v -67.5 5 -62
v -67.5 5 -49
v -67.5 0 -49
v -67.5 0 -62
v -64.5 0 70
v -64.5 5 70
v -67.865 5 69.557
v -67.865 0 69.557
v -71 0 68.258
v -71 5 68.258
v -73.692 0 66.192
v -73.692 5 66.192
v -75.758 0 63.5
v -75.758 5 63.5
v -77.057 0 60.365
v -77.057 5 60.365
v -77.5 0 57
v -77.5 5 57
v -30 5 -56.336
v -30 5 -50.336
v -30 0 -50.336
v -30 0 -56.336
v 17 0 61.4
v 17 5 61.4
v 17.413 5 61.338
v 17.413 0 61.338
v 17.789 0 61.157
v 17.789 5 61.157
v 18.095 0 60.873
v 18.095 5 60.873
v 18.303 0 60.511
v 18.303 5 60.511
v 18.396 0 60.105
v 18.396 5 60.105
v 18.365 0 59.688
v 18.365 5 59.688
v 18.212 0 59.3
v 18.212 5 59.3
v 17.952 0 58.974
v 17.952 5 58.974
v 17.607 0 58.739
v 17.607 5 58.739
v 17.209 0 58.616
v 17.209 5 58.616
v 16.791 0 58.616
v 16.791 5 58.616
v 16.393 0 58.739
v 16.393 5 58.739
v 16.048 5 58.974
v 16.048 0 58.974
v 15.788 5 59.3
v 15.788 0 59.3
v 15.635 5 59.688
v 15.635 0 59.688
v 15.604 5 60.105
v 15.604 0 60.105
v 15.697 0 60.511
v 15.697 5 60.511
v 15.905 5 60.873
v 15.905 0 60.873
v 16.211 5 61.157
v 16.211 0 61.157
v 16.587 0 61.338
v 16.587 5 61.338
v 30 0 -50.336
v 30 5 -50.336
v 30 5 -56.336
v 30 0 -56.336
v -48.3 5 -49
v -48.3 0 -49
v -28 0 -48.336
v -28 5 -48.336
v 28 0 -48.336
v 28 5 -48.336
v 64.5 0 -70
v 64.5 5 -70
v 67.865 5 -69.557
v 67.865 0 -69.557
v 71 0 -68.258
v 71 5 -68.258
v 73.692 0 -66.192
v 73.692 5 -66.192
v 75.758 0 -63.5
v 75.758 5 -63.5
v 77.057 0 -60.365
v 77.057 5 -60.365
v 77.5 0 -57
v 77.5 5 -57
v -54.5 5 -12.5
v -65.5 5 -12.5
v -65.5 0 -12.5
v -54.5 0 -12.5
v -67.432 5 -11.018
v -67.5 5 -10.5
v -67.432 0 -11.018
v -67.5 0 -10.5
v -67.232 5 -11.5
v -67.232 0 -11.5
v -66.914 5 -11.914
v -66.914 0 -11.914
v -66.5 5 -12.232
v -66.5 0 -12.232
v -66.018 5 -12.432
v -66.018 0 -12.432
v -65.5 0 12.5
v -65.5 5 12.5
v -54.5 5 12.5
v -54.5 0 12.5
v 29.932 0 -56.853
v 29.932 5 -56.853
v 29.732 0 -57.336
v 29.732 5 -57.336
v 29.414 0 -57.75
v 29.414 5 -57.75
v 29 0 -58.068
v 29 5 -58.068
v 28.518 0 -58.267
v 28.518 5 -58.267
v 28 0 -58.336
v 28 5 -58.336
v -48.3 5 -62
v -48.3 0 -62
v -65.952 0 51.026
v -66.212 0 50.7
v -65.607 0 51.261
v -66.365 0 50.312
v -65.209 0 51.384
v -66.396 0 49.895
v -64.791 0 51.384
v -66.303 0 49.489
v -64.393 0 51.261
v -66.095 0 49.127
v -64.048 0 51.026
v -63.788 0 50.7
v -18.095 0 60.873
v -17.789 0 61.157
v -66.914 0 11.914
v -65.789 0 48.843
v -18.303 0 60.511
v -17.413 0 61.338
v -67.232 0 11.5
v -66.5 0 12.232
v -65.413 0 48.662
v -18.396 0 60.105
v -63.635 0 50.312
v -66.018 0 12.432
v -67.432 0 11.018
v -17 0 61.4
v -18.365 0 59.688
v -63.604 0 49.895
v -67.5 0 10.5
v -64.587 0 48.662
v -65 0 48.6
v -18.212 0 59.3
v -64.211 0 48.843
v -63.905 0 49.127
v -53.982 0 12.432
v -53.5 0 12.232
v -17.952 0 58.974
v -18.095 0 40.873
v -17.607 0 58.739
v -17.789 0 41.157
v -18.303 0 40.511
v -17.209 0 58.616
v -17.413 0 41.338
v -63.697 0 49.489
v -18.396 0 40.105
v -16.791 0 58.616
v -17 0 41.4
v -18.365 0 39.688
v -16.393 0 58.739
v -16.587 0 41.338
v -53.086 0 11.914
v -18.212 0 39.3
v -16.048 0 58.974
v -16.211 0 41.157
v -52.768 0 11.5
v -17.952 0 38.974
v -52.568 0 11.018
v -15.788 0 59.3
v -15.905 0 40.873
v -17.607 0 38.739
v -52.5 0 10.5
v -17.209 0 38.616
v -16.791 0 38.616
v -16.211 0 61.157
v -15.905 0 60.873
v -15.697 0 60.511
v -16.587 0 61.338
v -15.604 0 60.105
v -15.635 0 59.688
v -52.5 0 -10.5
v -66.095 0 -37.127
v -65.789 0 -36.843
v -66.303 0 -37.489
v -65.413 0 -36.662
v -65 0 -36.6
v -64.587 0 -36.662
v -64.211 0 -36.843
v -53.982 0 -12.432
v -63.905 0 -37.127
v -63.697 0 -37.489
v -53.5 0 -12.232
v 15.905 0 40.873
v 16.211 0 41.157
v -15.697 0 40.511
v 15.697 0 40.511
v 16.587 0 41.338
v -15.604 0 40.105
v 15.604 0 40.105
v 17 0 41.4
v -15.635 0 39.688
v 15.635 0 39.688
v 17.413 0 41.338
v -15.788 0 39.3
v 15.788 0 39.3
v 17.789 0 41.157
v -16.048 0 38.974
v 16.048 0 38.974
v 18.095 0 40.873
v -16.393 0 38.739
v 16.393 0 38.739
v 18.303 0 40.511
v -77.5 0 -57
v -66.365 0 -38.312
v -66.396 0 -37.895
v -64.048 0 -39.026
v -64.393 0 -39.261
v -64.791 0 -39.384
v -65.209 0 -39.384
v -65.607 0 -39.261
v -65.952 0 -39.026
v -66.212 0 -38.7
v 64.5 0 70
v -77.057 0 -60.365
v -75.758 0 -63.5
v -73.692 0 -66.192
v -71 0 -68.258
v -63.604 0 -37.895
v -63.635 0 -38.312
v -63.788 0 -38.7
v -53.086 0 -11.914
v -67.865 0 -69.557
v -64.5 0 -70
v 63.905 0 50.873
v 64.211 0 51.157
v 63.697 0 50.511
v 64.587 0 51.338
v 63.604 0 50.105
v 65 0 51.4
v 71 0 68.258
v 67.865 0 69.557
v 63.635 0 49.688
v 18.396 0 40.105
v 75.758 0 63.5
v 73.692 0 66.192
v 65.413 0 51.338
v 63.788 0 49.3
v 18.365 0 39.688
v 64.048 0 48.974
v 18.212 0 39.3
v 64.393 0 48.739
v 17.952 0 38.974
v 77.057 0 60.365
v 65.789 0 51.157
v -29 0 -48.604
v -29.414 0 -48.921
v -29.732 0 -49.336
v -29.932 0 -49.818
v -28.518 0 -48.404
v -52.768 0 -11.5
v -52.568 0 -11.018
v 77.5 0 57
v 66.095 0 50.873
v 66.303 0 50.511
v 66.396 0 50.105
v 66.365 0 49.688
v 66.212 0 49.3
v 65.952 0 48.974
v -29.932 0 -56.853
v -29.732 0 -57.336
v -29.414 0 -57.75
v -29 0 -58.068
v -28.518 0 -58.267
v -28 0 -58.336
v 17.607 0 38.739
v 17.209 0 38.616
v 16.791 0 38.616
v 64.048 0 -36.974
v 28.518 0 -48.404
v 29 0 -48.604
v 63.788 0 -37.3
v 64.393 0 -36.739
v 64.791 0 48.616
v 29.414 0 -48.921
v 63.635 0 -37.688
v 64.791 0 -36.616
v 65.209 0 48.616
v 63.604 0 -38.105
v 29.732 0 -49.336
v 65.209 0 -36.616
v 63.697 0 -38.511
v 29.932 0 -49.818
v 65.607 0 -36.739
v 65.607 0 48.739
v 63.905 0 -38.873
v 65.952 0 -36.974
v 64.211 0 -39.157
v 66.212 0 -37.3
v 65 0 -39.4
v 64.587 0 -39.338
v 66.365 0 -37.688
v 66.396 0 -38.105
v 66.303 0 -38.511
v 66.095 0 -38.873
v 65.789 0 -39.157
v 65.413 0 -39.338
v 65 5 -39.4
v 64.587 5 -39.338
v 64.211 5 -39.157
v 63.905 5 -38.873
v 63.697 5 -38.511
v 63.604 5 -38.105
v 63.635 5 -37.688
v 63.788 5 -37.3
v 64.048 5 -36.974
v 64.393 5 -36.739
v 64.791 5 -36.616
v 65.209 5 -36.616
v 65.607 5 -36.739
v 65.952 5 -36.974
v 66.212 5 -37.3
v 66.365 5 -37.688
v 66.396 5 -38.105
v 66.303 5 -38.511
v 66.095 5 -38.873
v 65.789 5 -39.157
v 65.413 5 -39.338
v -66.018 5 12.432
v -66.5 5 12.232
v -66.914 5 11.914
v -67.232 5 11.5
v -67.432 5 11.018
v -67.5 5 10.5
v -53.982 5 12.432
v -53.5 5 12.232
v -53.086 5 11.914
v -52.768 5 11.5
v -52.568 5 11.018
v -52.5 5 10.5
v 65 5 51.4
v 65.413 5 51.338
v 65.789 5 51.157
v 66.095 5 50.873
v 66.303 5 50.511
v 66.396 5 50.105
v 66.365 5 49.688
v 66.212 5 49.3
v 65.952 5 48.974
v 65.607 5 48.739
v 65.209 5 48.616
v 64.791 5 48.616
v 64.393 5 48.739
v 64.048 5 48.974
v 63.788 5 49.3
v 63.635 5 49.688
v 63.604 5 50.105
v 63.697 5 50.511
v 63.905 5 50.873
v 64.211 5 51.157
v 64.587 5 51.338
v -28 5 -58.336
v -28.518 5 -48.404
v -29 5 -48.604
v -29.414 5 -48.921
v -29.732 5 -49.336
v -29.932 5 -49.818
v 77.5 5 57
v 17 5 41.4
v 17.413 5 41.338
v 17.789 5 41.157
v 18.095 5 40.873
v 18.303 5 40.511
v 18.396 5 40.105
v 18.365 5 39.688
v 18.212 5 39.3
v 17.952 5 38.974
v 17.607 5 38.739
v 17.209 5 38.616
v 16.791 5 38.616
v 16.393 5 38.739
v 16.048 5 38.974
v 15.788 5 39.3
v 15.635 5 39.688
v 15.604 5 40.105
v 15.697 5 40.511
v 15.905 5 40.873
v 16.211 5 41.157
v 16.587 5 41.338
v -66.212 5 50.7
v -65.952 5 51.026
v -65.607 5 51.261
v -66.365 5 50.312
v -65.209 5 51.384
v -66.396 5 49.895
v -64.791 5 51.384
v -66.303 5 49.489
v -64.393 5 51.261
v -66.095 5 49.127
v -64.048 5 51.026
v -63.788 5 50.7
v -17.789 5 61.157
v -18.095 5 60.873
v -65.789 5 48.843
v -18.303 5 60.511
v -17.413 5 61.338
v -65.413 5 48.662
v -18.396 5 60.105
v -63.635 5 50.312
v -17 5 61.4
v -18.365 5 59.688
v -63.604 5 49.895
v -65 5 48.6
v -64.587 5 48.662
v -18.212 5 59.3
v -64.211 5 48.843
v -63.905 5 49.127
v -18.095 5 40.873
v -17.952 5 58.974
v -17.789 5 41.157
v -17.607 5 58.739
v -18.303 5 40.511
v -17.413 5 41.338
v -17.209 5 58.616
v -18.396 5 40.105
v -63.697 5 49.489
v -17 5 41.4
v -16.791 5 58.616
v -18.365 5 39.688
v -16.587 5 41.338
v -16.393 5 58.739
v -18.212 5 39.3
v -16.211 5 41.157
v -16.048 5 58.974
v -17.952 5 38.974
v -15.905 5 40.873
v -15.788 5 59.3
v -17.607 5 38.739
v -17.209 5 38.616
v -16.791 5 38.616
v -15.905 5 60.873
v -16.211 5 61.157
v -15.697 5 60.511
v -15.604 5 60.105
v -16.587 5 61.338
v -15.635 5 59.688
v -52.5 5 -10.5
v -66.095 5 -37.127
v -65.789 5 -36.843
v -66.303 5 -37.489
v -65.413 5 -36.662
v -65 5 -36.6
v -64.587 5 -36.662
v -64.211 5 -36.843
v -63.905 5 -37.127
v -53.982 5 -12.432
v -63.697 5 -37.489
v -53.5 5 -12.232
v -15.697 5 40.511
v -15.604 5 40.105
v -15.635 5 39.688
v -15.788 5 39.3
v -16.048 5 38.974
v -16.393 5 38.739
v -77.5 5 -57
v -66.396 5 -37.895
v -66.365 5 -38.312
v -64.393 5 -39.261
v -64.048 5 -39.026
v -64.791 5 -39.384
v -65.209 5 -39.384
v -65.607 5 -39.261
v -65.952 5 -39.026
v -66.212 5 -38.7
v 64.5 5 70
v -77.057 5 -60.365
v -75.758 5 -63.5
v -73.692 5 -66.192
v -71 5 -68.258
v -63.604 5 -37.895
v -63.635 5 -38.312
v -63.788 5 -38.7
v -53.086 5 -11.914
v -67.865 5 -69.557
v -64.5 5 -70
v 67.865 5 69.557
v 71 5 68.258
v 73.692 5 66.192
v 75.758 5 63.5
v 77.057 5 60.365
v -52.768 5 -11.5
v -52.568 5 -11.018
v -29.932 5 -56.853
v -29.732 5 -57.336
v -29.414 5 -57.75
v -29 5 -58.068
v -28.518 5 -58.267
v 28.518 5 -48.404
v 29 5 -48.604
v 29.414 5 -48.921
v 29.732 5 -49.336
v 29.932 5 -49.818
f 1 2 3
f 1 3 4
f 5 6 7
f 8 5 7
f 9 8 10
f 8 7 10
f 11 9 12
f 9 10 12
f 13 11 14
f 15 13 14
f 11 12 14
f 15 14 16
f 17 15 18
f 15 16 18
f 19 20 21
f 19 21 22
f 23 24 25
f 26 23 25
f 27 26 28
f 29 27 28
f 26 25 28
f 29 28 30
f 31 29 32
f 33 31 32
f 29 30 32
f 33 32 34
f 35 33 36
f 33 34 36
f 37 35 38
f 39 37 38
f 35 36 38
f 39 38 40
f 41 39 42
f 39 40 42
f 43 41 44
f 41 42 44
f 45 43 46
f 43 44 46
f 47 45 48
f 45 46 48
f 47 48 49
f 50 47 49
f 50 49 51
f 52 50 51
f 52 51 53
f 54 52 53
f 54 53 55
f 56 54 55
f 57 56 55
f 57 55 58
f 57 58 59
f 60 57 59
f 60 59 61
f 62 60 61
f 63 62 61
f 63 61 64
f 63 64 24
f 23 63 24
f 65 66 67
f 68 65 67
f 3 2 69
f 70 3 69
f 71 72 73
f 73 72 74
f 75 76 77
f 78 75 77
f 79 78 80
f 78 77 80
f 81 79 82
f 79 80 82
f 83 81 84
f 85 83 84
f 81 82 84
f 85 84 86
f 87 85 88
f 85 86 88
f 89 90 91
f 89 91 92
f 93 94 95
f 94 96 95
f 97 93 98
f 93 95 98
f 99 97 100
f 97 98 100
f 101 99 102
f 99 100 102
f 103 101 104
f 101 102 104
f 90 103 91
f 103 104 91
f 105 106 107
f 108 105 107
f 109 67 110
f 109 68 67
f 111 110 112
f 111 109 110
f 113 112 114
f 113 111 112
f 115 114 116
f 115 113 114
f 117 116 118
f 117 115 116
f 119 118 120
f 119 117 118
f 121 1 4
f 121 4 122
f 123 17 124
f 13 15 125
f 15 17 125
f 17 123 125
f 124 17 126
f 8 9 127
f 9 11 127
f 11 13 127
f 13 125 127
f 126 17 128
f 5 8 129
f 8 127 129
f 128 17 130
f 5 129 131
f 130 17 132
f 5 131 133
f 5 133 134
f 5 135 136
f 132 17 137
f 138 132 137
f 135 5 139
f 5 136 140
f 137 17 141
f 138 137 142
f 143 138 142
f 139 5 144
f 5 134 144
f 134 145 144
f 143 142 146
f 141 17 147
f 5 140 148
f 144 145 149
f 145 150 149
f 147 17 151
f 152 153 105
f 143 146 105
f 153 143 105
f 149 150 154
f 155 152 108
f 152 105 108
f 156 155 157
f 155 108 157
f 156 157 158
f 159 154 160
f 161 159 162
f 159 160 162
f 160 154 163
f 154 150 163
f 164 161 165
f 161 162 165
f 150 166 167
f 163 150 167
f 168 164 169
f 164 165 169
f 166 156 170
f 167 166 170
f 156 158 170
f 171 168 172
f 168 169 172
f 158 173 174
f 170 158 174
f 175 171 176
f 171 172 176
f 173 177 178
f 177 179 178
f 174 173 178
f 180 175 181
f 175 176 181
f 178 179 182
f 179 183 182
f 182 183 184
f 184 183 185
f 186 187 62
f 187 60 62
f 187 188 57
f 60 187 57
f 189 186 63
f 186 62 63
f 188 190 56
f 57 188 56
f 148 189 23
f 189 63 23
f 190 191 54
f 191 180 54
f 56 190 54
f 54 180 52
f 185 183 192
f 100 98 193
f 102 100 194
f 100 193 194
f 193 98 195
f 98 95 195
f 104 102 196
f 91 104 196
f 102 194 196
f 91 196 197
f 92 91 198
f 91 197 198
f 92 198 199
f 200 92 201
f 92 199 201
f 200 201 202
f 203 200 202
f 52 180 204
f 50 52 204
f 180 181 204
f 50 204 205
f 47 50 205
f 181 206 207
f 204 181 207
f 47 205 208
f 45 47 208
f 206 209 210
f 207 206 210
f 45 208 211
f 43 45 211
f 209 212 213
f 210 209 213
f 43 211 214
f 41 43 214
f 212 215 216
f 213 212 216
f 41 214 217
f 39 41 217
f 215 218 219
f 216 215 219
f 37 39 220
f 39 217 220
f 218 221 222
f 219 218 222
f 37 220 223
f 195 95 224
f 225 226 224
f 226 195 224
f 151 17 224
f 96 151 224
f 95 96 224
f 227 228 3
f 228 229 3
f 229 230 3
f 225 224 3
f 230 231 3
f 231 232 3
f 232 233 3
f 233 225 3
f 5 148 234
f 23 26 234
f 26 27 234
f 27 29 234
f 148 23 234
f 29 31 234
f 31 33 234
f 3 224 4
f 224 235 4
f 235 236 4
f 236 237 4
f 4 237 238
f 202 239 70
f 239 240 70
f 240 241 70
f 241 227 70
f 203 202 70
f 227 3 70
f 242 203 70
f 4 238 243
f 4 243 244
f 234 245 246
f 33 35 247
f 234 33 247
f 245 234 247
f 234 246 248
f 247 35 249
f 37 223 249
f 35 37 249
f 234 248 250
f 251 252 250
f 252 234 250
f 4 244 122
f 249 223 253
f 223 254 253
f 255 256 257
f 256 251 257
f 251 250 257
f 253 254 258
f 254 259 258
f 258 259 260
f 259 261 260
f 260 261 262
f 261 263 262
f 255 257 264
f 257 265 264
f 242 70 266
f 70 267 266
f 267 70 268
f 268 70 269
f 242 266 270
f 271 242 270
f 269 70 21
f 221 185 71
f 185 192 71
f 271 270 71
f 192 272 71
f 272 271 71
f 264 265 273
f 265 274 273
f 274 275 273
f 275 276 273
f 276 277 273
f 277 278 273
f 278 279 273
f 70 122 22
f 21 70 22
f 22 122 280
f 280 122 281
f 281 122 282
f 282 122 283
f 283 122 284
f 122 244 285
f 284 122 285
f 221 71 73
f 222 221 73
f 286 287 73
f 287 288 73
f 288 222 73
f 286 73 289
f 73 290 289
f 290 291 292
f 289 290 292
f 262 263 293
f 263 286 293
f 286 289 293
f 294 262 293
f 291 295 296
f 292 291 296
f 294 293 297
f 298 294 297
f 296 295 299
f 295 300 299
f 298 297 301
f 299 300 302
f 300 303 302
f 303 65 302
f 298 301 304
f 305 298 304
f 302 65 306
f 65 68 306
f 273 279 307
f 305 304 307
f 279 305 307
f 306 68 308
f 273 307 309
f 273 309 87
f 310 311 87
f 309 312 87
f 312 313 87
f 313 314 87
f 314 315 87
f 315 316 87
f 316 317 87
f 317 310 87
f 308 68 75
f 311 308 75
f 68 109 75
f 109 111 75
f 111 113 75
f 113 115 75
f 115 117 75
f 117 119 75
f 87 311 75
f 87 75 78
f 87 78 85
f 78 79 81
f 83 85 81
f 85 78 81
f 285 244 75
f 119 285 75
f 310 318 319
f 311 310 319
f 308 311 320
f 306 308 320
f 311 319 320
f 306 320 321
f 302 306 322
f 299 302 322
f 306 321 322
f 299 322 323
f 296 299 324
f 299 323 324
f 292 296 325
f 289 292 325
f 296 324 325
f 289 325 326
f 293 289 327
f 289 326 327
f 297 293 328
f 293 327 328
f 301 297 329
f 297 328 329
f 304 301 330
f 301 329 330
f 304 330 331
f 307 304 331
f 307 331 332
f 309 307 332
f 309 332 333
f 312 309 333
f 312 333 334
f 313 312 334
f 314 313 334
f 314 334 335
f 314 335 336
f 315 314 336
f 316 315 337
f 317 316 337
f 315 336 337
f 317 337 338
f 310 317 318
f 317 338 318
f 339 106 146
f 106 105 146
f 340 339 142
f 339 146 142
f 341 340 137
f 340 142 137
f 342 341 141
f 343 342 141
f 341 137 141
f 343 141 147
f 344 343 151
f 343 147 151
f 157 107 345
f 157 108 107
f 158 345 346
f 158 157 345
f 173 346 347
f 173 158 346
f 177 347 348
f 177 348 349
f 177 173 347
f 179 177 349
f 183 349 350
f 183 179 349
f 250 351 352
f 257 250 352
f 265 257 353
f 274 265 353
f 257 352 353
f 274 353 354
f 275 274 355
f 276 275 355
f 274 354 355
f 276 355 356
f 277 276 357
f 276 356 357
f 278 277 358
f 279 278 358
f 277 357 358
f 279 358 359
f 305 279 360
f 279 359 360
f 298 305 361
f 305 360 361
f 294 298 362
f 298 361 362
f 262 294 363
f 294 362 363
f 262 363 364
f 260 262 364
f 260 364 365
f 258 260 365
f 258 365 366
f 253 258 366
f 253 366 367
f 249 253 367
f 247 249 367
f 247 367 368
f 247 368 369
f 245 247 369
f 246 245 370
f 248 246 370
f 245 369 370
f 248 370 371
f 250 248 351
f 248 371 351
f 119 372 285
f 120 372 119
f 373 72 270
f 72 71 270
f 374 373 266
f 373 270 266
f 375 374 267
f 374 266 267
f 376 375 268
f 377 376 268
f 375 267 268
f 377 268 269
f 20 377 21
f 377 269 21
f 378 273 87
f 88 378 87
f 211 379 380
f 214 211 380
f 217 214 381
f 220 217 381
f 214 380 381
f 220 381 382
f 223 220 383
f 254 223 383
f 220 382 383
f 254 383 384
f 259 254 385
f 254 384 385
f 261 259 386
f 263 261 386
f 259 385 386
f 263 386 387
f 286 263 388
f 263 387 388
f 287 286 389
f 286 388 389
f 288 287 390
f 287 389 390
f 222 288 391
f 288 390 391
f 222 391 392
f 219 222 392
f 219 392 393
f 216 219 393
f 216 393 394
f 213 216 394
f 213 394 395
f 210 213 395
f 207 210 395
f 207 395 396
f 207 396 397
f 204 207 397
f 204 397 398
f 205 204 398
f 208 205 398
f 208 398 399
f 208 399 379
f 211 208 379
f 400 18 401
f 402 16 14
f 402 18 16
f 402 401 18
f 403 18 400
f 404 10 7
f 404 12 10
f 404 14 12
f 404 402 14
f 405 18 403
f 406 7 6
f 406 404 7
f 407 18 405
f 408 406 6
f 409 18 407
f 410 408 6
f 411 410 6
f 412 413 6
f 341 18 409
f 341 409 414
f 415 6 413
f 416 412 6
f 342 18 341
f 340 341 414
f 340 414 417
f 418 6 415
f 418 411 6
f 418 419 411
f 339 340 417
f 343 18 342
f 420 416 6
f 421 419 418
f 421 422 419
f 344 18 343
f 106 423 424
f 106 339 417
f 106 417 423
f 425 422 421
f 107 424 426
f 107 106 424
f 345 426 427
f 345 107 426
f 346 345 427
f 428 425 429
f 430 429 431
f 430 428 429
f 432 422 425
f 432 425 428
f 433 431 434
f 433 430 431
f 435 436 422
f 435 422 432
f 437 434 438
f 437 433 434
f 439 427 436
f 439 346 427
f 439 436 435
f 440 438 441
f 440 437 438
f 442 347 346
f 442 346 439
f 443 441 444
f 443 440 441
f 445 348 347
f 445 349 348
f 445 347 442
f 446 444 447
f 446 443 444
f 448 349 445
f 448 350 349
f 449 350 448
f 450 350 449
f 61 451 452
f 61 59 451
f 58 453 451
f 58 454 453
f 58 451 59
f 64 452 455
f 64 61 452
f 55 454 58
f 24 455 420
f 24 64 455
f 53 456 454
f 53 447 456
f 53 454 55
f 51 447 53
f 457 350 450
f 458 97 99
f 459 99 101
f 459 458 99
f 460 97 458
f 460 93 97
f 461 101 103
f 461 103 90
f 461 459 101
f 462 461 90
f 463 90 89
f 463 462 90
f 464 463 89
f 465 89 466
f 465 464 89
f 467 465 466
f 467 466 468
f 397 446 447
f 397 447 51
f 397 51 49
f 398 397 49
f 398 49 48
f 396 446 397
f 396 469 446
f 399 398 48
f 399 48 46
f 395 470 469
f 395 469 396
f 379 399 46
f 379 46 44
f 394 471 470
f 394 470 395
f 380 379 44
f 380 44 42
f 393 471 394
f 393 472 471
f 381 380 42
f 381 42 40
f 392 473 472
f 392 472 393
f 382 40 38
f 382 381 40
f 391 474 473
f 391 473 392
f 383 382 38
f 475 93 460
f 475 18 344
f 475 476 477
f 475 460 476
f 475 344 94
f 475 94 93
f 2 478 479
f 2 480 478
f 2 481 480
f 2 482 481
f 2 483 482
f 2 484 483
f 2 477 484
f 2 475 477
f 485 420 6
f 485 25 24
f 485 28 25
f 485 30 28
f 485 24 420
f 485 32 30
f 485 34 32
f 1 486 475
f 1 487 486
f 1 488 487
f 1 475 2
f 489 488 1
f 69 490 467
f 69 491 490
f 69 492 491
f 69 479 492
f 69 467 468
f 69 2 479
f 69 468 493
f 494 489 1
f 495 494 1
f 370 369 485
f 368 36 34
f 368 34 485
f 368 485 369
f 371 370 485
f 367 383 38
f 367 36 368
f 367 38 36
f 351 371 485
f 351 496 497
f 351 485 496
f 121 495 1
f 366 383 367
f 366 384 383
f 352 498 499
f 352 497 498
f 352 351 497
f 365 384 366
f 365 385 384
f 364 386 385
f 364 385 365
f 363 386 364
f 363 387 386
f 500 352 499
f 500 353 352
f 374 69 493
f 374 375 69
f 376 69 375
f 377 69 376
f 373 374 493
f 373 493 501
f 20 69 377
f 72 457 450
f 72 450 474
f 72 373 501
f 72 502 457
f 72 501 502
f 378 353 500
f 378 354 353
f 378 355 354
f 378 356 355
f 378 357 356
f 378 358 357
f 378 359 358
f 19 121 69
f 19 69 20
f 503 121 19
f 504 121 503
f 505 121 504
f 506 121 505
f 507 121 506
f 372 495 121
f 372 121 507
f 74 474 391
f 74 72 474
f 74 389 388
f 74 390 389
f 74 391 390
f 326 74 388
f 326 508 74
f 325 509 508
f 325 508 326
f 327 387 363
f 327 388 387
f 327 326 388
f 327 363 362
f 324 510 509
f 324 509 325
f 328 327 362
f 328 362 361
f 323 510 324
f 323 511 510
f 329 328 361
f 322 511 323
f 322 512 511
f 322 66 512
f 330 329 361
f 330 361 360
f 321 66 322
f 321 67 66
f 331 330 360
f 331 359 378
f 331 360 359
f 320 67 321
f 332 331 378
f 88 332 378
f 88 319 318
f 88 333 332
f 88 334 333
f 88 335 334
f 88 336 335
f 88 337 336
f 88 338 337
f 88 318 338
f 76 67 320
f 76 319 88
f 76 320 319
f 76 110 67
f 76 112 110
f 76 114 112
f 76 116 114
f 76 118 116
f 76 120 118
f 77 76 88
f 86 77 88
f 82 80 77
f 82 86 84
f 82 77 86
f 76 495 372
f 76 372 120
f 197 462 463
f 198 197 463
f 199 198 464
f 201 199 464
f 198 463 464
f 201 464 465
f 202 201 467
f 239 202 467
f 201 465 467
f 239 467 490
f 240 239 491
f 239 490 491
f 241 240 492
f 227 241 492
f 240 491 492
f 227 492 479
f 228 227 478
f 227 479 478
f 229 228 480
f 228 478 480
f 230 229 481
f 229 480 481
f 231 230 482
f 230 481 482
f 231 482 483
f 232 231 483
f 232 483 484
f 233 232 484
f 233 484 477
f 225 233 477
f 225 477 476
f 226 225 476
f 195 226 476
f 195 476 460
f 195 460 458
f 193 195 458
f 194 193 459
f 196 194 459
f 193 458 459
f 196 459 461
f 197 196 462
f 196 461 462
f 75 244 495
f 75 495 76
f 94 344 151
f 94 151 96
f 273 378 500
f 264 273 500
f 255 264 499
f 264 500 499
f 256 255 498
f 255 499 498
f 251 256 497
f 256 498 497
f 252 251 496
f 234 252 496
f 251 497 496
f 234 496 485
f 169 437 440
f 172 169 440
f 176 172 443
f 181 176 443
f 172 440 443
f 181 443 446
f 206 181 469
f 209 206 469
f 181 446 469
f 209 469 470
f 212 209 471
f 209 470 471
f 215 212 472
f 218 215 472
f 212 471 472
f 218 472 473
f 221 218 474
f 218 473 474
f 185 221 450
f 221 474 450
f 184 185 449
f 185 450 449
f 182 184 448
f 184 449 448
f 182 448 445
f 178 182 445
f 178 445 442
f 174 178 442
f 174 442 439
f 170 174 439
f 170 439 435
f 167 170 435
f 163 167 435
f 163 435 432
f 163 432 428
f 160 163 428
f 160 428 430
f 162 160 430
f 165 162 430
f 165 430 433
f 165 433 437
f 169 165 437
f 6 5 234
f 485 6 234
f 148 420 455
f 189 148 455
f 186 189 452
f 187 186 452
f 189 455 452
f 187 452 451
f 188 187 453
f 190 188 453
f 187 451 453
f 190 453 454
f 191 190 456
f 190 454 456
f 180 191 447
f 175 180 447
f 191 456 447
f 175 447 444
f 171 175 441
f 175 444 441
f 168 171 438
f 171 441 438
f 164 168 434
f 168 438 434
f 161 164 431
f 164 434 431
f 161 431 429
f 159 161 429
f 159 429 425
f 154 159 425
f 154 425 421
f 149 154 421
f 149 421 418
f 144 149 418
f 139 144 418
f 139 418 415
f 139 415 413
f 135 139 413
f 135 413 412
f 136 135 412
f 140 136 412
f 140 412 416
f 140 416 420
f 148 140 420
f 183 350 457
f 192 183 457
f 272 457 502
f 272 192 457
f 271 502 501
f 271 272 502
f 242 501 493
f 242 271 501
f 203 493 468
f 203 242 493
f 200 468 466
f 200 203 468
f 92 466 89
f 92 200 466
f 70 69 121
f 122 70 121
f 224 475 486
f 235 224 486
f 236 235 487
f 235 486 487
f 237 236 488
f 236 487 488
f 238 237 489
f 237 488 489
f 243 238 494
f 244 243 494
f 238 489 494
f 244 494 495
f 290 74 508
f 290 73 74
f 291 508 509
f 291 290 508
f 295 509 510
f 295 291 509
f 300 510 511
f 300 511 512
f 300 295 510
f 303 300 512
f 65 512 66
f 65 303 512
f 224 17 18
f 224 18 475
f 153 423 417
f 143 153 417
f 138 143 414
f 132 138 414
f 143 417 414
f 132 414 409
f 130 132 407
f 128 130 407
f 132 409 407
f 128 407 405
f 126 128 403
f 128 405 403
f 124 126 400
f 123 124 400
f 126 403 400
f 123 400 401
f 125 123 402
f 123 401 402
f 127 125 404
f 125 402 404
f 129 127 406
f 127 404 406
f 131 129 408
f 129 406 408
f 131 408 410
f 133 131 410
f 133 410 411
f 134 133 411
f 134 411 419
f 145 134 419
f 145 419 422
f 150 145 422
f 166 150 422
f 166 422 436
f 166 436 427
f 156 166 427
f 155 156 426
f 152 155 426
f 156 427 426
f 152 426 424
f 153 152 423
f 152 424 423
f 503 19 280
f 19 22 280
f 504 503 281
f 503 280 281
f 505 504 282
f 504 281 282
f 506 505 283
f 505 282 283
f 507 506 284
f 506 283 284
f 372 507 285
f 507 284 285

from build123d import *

# Parameters (mm, degrees)
SKETCH1_W           = 155
SKETCH1_H           = 140
BOSS_EXTRUDE1_DEPTH = 5
CUT_EXTRUDE1_DEPTH  = 5
SKETCH3_R           = 1.4
CUT_EXTRUDE2_DEPTH  = 5
SKETCH5_W           = 60
SKETCH5_H           = 10
CUT_EXTRUDE3_DEPTH  = 5
SKETCH6_R           = 1.4
CUT_EXTRUDE4_DEPTH  = 10
SKETCH7_W           = 15
SKETCH7_H           = 25
CUT_EXTRUDE5_DEPTH  = 10
SKETCH8_W           = 19.2
SKETCH8_H           = 13
CUT_EXTRUDE6_DEPTH  = 10
FILLET2_R           = 2
FILLET3_R           = 2


with BuildPart() as part:
    # Sketch1 → Boss-Extrude1 (new body)
    with BuildSketch(Plane(origin=(0, 0, 0), x_dir=(1, 0, 0), z_dir=(0, 1, 0))):
        Rectangle(SKETCH1_W, SKETCH1_H)
    extrude(amount=BOSS_EXTRUDE1_DEPTH)

    # Sketch2 → Cut-Extrude1 (cut)
    with BuildSketch(Plane(origin=(0, 5, 0), x_dir=(1, 0, 0), z_dir=(0, 1, 0))):
        with BuildLine():
            Line((-77.5, 70), (-77.5, 57))
            ThreePointArc((-77.5, 57), (-73.692388155, 66.192388155), (-64.5, 70))
            Line((-64.5, 70), (-77.5, 70))
        make_face()
        with BuildLine():
            Line((77.5, 70), (64.5, 70))
            ThreePointArc((64.5, 70), (73.692388155, 66.192388155), (77.5, 57))
            Line((77.5, 57), (77.5, 70))
        make_face()
        with BuildLine():
            Line((77.5, -70), (77.5, -57))
            ThreePointArc((77.5, -57), (73.692388155, -66.192388155), (64.5, -70))
            Line((64.5, -70), (77.5, -70))
        make_face()
        with BuildLine():
            Line((-77.5, -70), (-64.5, -70))
            ThreePointArc((-64.5, -70), (-73.692388155, -66.192388155), (-77.5, -57))
            Line((-77.5, -57), (-77.5, -70))
        make_face()
    extrude(amount=-CUT_EXTRUDE1_DEPTH, mode=Mode.SUBTRACT)

    # Sketch3 → Cut-Extrude2 (cut)
    with BuildSketch(Plane(origin=(0, 5, 0), x_dir=(1, 0, 0), z_dir=(0, 1, 0))):
        with Locations(Location((-65, 38, 0), (0, 0, 270))):
            Circle(SKETCH3_R)
        with Locations(Location((65, 38, 0), (0, 0, 90))):
            Circle(SKETCH3_R)
        with Locations(Location((65, -50, 0), (0, 0, 270))):
            Circle(SKETCH3_R)
        with Locations(Location((-65, -50, 0), (0, 0, 90))):
            Circle(SKETCH3_R)
    extrude(amount=-CUT_EXTRUDE2_DEPTH, mode=Mode.SUBTRACT)

    # Sketch5 → Cut-Extrude3 (cut)
    with BuildSketch(Plane(origin=(0, 5, 0), x_dir=(1, 0, 0), z_dir=(0, 1, 0))):
        with Locations((0, 53.335629909)):
            Rectangle(SKETCH5_W, SKETCH5_H)
    extrude(amount=-CUT_EXTRUDE3_DEPTH, mode=Mode.SUBTRACT)

    # Sketch6 → Cut-Extrude4 (cut)
    with BuildSketch(Plane(origin=(0, 5, 0), x_dir=(1, 0, 0), z_dir=(0, 1, 0))):
        with Locations(Location((-17, -40, 0), (0, 0, 270))):
            Circle(SKETCH6_R)
        with Locations(Location((17, -40, 0), (0, 0, 270))):
            Circle(SKETCH6_R)
        with Locations(Location((17, -60, 0), (0, 0, 270))):
            Circle(SKETCH6_R)
        with Locations(Location((-17, -60, 0), (0, 0, 270))):
            Circle(SKETCH6_R)
    extrude(amount=-CUT_EXTRUDE4_DEPTH, mode=Mode.SUBTRACT)

    # Sketch7 → Cut-Extrude5 (cut)
    with BuildSketch(Plane(origin=(0, 5, 0), x_dir=(1, 0, 0), z_dir=(0, 1, 0))):
        with Locations((-60, 0)):
            Rectangle(SKETCH7_W, SKETCH7_H)
    extrude(amount=-CUT_EXTRUDE5_DEPTH, mode=Mode.SUBTRACT)

    # Sketch8 → Cut-Extrude6 (cut)
    with BuildSketch(Plane(origin=(0, 5, 0), x_dir=(1, 0, 0), z_dir=(0, 1, 0))):
        with Locations((-57.9, 55.5)):
            Rectangle(SKETCH8_W, SKETCH8_H)
    extrude(amount=-CUT_EXTRUDE6_DEPTH, mode=Mode.SUBTRACT)

    # Fillet2
    fillet2_edges = [part.edges().sort_by_distance(p)[0] for p in [
        (-52.5, 2.5, -12.5),
        (-52.5, 2.5, 12.5),
        (-67.5, 2.5, 12.5),
        (-67.5, 2.5, -12.5),
    ]]
    fillet(fillet2_edges, radius=FILLET2_R)

    # Fillet3
    fillet3_edges = [part.edges().sort_by_distance(p)[0] for p in [
        (30, 2.5, -58.335629909),
        (30, 2.5, -48.335629909),
        (-30, 2.5, -48.335629909),
        (-30, 2.5, -58.335629909),
    ]]
    fillet(fillet3_edges, radius=FILLET3_R)


solid = part.part
